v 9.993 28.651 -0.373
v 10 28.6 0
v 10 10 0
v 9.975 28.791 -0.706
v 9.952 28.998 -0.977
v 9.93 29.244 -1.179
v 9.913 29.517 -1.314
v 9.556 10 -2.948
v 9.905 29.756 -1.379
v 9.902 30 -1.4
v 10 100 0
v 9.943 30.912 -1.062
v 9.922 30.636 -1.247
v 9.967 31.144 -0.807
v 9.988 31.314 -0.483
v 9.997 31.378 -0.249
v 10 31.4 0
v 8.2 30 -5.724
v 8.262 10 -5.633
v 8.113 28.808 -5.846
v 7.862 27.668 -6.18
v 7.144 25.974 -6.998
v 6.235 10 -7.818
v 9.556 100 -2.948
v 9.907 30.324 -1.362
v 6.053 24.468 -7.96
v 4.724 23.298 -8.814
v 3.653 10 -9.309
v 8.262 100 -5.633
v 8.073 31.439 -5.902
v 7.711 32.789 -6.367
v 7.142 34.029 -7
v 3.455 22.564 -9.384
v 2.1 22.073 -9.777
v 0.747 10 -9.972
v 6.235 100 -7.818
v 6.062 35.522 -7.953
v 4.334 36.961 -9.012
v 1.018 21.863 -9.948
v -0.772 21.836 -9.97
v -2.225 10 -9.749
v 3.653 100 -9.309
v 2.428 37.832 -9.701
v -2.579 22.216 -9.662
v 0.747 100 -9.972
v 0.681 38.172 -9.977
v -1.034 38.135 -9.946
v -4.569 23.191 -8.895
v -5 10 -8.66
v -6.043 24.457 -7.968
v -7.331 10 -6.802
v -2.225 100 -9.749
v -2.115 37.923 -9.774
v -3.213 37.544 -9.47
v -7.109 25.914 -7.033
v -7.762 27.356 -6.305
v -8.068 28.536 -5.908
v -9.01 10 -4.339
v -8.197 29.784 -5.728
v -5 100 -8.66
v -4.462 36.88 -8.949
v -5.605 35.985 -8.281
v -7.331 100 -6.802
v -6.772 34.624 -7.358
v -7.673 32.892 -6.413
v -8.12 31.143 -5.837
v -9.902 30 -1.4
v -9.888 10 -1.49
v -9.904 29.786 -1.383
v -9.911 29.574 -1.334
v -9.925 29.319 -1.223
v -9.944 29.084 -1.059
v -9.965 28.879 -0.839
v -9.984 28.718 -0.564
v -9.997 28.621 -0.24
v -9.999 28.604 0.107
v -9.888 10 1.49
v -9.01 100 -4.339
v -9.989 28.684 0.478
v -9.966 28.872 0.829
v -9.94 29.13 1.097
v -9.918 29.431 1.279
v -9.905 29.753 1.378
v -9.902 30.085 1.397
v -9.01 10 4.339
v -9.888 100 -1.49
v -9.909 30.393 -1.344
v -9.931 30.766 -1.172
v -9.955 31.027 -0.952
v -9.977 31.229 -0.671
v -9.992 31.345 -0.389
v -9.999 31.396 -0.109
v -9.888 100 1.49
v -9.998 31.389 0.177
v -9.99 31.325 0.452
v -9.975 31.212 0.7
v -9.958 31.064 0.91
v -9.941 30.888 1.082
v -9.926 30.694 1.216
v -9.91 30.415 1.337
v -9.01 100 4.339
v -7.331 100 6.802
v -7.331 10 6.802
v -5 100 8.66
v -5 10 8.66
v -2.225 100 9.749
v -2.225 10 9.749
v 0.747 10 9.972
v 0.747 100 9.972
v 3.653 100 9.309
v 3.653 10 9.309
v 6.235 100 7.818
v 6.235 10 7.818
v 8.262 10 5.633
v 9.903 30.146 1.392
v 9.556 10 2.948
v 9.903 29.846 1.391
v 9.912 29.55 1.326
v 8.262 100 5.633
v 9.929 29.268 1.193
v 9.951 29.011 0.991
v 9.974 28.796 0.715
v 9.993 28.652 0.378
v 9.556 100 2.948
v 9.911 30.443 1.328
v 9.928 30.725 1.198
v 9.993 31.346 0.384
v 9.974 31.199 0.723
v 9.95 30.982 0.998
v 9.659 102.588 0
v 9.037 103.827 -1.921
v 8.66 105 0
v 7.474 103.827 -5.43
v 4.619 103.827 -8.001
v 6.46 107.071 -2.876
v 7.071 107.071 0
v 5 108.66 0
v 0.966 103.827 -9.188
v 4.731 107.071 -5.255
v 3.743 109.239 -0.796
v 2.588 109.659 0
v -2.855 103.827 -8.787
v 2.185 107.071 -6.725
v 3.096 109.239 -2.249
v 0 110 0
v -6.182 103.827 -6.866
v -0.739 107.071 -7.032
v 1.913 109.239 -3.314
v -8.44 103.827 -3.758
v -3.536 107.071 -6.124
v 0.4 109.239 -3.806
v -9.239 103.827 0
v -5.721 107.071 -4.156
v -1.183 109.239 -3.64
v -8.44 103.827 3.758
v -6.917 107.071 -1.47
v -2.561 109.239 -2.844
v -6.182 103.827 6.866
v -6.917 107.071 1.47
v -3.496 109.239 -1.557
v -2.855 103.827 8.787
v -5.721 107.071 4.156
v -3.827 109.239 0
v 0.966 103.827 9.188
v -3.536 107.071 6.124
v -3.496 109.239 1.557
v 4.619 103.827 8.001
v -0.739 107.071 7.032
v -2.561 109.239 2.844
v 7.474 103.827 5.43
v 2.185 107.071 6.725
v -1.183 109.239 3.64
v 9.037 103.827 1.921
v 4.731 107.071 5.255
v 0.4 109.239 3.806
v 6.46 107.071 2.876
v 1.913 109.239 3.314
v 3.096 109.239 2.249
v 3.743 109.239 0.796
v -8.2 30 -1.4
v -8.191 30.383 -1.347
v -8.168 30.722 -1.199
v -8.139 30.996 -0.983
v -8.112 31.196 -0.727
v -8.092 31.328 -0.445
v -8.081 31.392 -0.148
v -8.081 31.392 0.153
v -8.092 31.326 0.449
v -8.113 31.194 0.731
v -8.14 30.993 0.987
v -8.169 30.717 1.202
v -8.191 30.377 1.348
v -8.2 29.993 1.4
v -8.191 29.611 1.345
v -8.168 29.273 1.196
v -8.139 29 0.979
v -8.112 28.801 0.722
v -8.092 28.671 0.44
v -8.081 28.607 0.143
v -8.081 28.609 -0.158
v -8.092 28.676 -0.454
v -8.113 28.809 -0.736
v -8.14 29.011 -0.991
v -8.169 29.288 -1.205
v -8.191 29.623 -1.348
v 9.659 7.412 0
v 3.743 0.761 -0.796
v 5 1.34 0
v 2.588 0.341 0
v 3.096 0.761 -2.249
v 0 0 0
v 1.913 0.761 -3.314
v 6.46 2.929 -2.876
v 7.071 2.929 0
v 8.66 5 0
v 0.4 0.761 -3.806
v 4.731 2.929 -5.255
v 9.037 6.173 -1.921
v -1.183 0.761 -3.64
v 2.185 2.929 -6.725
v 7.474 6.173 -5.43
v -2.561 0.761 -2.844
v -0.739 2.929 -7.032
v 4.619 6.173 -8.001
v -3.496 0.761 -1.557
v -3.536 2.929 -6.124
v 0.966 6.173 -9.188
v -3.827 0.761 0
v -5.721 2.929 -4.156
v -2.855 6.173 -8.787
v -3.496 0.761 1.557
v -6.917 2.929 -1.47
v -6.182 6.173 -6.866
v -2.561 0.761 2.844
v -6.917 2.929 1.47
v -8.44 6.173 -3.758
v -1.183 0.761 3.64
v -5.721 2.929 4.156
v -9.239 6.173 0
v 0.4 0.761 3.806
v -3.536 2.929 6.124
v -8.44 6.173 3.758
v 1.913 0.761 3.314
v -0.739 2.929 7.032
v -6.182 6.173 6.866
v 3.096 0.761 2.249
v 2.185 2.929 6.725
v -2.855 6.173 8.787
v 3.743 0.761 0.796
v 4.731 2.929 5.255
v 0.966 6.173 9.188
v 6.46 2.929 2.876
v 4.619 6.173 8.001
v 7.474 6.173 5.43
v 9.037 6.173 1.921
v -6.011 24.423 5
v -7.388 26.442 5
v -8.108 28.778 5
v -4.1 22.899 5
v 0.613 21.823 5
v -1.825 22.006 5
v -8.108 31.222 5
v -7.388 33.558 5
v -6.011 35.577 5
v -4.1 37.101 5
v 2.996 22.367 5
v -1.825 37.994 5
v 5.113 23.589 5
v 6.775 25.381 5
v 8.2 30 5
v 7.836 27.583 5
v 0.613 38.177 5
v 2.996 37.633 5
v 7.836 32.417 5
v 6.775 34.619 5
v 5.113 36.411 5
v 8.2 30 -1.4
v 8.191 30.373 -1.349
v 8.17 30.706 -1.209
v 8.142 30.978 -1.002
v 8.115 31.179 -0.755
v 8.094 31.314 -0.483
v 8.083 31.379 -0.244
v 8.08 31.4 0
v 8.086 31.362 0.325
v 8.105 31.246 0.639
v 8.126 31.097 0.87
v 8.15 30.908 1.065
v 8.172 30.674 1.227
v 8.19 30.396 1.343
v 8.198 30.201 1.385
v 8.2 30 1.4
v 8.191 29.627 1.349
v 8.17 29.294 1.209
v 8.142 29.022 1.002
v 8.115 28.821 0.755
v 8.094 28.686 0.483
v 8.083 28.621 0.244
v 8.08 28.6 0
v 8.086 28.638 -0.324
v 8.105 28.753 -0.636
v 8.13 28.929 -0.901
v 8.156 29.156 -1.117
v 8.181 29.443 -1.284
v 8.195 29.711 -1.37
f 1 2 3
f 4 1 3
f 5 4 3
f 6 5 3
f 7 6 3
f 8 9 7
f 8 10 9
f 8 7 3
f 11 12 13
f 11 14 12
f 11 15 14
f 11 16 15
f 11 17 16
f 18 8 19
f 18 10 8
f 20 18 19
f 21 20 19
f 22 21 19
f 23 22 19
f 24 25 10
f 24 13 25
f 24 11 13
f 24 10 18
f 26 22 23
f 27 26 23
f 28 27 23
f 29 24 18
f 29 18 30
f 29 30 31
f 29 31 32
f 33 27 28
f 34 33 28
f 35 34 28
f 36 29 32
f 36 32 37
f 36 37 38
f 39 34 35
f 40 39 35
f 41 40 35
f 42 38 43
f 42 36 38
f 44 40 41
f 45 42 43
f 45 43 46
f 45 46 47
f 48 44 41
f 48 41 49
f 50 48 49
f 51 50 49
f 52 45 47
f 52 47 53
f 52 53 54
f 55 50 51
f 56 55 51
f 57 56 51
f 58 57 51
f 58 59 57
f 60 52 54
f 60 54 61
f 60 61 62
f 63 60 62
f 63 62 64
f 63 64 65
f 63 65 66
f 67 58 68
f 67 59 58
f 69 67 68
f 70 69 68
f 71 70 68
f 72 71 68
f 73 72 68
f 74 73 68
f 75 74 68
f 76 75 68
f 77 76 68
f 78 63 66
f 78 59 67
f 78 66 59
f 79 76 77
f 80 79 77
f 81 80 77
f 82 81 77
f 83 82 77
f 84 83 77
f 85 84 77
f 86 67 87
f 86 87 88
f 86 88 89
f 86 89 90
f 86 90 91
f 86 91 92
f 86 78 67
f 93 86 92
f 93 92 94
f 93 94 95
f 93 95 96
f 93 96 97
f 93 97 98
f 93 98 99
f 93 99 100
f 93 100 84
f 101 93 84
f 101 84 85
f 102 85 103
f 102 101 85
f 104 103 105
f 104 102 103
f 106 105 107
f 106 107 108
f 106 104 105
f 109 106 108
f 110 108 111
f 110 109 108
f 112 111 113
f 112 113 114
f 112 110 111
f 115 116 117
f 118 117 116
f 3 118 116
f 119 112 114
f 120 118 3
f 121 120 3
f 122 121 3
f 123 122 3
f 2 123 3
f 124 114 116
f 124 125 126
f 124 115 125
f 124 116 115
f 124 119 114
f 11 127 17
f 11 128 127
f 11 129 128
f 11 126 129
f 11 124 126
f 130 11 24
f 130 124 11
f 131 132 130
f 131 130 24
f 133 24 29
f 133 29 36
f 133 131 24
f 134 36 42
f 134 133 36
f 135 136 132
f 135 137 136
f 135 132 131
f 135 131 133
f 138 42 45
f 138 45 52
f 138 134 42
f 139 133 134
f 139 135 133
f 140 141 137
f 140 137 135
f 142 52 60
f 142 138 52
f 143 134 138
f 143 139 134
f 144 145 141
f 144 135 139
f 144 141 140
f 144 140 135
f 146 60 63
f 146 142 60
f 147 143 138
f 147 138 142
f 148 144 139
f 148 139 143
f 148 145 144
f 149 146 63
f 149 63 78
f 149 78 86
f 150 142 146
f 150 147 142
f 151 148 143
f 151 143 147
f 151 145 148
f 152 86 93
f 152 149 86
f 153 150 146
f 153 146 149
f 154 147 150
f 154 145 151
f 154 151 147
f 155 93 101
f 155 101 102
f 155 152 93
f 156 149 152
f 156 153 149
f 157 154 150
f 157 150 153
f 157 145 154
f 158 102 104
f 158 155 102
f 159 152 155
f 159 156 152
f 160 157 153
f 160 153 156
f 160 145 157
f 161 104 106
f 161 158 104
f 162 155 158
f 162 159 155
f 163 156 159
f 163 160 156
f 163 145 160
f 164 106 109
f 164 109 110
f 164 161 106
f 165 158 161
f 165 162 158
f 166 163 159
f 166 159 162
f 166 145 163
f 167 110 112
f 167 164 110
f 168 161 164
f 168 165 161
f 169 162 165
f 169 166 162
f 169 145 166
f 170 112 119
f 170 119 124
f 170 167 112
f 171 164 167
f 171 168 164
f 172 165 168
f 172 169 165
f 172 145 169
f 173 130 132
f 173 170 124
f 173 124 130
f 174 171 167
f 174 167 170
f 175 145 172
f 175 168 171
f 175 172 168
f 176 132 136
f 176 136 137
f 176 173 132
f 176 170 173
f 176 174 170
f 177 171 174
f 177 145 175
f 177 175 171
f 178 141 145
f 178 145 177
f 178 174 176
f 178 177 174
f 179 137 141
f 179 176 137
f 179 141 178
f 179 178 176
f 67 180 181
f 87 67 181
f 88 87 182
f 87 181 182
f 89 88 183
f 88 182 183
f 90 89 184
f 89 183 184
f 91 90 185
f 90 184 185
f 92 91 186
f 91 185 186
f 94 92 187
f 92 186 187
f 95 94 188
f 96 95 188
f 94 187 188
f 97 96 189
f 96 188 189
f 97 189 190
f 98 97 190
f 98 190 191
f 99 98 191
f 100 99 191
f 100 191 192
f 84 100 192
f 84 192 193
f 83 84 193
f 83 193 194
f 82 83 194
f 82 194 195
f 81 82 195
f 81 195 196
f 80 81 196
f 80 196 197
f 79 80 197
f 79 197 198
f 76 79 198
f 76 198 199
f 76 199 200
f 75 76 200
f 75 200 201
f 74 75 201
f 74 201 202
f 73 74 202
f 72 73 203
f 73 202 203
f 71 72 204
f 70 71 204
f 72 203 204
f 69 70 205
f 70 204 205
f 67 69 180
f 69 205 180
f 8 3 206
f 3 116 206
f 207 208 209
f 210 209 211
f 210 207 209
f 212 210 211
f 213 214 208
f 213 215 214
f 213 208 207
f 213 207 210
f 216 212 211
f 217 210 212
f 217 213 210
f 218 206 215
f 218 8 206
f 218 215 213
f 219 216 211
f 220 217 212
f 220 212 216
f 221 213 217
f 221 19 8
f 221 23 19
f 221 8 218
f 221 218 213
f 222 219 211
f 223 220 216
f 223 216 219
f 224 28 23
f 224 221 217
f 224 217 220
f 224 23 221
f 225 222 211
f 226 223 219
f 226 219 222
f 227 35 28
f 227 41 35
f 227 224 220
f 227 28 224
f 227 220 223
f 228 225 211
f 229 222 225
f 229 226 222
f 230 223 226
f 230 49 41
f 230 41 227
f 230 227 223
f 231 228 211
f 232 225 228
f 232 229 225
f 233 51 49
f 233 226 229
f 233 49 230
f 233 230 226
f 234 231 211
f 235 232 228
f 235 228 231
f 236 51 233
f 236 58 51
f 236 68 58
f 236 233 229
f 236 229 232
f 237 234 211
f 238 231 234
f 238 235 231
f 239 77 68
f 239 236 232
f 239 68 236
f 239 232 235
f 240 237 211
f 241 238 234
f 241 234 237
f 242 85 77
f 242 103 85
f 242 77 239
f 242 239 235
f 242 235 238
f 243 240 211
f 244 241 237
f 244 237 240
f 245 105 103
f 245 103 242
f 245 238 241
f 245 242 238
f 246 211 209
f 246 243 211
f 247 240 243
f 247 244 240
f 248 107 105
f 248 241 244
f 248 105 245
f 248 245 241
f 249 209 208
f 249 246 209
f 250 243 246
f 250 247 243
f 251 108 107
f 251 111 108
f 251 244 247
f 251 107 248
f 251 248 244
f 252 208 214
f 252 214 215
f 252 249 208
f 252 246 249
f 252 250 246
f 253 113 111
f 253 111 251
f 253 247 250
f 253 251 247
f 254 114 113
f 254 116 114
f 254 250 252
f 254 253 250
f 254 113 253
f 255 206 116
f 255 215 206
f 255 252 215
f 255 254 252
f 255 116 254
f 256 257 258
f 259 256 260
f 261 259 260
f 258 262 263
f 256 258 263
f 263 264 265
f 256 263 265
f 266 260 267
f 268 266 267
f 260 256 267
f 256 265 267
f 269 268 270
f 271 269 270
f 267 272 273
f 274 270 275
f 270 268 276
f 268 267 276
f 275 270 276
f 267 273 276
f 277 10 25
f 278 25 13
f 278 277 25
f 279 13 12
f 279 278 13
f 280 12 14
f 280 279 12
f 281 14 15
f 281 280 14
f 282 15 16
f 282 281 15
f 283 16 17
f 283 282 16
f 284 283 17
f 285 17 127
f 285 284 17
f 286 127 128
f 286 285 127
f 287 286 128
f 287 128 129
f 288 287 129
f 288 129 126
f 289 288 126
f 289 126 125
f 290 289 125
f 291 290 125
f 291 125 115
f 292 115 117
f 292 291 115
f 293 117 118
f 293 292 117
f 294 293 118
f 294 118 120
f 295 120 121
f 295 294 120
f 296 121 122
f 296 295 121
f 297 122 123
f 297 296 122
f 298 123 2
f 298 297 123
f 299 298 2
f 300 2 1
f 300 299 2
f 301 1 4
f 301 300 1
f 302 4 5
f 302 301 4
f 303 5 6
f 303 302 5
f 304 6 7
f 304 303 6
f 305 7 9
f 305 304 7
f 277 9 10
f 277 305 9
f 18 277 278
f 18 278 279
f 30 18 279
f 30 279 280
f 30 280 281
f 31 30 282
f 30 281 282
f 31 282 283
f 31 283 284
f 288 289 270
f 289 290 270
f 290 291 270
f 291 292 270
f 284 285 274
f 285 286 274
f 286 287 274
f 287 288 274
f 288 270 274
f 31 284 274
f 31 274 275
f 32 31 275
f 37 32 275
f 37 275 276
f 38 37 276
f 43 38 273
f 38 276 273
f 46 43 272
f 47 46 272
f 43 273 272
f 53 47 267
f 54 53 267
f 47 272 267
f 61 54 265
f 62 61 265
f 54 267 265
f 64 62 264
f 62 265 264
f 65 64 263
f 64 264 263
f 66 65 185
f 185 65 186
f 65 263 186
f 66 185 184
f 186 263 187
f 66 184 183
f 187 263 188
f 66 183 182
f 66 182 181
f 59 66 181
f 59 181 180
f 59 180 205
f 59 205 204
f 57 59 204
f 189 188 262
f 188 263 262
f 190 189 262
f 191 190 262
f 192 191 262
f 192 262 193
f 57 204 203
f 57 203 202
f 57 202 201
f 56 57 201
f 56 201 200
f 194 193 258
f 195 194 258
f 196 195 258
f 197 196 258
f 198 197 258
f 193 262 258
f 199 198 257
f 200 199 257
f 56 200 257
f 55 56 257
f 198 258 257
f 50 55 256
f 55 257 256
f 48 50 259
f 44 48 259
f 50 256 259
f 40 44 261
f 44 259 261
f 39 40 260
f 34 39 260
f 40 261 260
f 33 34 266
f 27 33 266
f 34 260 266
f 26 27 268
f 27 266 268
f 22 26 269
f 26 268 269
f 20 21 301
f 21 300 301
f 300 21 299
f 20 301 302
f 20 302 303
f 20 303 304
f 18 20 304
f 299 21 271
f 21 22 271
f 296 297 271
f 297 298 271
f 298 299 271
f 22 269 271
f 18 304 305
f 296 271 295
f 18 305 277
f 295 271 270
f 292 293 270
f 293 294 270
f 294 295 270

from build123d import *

# Parameters (mm, degrees)
SKETCH_1_W                      = 10
SKETCH_1_H                      = 110
CUT_EXTRUDE_1_REACH             = 112.905
SKETCH_2_R                      = 8.2
CUT_EXTRUDE_1_DIRECTION_2_DEPTH = 5
CUT_EXTRUDE_2_DEPTH             = 111.905365182
CUT_EXTRUDE_2_DEPTH_BACK        = 111.905365182
SKETCH_3_R                      = 1.4
FILLET_1_R                      = 10
FILLET_2_R                      = 10


with BuildPart() as part:
    # 草图1 → 旋转1 (revolve)
    with BuildSketch(Plane.XY):
        with Locations((5, 55)):
            Rectangle(SKETCH_1_W, SKETCH_1_H)
    revolve(axis=Axis((0, 0, 0), (0, 1, 0)))

    # 草图2 → 切除-拉伸1 (cut, up to next)
    with BuildSketch(Plane.XY, mode=Mode.PRIVATE) as cut_extrude_1_sk1:
        with Locations((0, 30)):
            Circle(SKETCH_2_R)
    cut_extrude_1_tool1 = extrude(cut_extrude_1_sk1.sketch, amount=-CUT_EXTRUDE_1_REACH, mode=Mode.PRIVATE) & part.part
    add(cut_extrude_1_tool1.solids().sort_by_distance((0, 30, 0))[0], mode=Mode.SUBTRACT)

    # 草图2 → 切除-拉伸1 direction 2 (cut)
    with BuildSketch(Plane.XY):
        with Locations((0, 30)):
            Circle(SKETCH_2_R)
    extrude(amount=CUT_EXTRUDE_1_DIRECTION_2_DEPTH, mode=Mode.SUBTRACT)

    # 草图3 → 切除-拉伸2 (cut, two sides: drawn at the far end of the back side and taken through both)
    with BuildSketch(Plane(origin=(0, 0, 0), x_dir=(0, 0, -1), z_dir=(1, 0, 0)).offset(-CUT_EXTRUDE_2_DEPTH_BACK)):
        with Locations((0, 30)):
            Circle(SKETCH_3_R)
    extrude(amount=CUT_EXTRUDE_2_DEPTH + CUT_EXTRUDE_2_DEPTH_BACK, mode=Mode.SUBTRACT)

    # 圆角1
    fillet_1_edges = [part.edges().sort_by_distance(p)[0] for p in [
        (-10, 0, 0),
    ]]
    fillet(fillet_1_edges, radius=FILLET_1_R)

    # 圆角2
    fillet_2_edges = [part.edges().sort_by_distance(p)[0] for p in [
        (-10, 110, 0),
    ]]
    fillet(fillet_2_edges, radius=FILLET_2_R)


solid = part.part
